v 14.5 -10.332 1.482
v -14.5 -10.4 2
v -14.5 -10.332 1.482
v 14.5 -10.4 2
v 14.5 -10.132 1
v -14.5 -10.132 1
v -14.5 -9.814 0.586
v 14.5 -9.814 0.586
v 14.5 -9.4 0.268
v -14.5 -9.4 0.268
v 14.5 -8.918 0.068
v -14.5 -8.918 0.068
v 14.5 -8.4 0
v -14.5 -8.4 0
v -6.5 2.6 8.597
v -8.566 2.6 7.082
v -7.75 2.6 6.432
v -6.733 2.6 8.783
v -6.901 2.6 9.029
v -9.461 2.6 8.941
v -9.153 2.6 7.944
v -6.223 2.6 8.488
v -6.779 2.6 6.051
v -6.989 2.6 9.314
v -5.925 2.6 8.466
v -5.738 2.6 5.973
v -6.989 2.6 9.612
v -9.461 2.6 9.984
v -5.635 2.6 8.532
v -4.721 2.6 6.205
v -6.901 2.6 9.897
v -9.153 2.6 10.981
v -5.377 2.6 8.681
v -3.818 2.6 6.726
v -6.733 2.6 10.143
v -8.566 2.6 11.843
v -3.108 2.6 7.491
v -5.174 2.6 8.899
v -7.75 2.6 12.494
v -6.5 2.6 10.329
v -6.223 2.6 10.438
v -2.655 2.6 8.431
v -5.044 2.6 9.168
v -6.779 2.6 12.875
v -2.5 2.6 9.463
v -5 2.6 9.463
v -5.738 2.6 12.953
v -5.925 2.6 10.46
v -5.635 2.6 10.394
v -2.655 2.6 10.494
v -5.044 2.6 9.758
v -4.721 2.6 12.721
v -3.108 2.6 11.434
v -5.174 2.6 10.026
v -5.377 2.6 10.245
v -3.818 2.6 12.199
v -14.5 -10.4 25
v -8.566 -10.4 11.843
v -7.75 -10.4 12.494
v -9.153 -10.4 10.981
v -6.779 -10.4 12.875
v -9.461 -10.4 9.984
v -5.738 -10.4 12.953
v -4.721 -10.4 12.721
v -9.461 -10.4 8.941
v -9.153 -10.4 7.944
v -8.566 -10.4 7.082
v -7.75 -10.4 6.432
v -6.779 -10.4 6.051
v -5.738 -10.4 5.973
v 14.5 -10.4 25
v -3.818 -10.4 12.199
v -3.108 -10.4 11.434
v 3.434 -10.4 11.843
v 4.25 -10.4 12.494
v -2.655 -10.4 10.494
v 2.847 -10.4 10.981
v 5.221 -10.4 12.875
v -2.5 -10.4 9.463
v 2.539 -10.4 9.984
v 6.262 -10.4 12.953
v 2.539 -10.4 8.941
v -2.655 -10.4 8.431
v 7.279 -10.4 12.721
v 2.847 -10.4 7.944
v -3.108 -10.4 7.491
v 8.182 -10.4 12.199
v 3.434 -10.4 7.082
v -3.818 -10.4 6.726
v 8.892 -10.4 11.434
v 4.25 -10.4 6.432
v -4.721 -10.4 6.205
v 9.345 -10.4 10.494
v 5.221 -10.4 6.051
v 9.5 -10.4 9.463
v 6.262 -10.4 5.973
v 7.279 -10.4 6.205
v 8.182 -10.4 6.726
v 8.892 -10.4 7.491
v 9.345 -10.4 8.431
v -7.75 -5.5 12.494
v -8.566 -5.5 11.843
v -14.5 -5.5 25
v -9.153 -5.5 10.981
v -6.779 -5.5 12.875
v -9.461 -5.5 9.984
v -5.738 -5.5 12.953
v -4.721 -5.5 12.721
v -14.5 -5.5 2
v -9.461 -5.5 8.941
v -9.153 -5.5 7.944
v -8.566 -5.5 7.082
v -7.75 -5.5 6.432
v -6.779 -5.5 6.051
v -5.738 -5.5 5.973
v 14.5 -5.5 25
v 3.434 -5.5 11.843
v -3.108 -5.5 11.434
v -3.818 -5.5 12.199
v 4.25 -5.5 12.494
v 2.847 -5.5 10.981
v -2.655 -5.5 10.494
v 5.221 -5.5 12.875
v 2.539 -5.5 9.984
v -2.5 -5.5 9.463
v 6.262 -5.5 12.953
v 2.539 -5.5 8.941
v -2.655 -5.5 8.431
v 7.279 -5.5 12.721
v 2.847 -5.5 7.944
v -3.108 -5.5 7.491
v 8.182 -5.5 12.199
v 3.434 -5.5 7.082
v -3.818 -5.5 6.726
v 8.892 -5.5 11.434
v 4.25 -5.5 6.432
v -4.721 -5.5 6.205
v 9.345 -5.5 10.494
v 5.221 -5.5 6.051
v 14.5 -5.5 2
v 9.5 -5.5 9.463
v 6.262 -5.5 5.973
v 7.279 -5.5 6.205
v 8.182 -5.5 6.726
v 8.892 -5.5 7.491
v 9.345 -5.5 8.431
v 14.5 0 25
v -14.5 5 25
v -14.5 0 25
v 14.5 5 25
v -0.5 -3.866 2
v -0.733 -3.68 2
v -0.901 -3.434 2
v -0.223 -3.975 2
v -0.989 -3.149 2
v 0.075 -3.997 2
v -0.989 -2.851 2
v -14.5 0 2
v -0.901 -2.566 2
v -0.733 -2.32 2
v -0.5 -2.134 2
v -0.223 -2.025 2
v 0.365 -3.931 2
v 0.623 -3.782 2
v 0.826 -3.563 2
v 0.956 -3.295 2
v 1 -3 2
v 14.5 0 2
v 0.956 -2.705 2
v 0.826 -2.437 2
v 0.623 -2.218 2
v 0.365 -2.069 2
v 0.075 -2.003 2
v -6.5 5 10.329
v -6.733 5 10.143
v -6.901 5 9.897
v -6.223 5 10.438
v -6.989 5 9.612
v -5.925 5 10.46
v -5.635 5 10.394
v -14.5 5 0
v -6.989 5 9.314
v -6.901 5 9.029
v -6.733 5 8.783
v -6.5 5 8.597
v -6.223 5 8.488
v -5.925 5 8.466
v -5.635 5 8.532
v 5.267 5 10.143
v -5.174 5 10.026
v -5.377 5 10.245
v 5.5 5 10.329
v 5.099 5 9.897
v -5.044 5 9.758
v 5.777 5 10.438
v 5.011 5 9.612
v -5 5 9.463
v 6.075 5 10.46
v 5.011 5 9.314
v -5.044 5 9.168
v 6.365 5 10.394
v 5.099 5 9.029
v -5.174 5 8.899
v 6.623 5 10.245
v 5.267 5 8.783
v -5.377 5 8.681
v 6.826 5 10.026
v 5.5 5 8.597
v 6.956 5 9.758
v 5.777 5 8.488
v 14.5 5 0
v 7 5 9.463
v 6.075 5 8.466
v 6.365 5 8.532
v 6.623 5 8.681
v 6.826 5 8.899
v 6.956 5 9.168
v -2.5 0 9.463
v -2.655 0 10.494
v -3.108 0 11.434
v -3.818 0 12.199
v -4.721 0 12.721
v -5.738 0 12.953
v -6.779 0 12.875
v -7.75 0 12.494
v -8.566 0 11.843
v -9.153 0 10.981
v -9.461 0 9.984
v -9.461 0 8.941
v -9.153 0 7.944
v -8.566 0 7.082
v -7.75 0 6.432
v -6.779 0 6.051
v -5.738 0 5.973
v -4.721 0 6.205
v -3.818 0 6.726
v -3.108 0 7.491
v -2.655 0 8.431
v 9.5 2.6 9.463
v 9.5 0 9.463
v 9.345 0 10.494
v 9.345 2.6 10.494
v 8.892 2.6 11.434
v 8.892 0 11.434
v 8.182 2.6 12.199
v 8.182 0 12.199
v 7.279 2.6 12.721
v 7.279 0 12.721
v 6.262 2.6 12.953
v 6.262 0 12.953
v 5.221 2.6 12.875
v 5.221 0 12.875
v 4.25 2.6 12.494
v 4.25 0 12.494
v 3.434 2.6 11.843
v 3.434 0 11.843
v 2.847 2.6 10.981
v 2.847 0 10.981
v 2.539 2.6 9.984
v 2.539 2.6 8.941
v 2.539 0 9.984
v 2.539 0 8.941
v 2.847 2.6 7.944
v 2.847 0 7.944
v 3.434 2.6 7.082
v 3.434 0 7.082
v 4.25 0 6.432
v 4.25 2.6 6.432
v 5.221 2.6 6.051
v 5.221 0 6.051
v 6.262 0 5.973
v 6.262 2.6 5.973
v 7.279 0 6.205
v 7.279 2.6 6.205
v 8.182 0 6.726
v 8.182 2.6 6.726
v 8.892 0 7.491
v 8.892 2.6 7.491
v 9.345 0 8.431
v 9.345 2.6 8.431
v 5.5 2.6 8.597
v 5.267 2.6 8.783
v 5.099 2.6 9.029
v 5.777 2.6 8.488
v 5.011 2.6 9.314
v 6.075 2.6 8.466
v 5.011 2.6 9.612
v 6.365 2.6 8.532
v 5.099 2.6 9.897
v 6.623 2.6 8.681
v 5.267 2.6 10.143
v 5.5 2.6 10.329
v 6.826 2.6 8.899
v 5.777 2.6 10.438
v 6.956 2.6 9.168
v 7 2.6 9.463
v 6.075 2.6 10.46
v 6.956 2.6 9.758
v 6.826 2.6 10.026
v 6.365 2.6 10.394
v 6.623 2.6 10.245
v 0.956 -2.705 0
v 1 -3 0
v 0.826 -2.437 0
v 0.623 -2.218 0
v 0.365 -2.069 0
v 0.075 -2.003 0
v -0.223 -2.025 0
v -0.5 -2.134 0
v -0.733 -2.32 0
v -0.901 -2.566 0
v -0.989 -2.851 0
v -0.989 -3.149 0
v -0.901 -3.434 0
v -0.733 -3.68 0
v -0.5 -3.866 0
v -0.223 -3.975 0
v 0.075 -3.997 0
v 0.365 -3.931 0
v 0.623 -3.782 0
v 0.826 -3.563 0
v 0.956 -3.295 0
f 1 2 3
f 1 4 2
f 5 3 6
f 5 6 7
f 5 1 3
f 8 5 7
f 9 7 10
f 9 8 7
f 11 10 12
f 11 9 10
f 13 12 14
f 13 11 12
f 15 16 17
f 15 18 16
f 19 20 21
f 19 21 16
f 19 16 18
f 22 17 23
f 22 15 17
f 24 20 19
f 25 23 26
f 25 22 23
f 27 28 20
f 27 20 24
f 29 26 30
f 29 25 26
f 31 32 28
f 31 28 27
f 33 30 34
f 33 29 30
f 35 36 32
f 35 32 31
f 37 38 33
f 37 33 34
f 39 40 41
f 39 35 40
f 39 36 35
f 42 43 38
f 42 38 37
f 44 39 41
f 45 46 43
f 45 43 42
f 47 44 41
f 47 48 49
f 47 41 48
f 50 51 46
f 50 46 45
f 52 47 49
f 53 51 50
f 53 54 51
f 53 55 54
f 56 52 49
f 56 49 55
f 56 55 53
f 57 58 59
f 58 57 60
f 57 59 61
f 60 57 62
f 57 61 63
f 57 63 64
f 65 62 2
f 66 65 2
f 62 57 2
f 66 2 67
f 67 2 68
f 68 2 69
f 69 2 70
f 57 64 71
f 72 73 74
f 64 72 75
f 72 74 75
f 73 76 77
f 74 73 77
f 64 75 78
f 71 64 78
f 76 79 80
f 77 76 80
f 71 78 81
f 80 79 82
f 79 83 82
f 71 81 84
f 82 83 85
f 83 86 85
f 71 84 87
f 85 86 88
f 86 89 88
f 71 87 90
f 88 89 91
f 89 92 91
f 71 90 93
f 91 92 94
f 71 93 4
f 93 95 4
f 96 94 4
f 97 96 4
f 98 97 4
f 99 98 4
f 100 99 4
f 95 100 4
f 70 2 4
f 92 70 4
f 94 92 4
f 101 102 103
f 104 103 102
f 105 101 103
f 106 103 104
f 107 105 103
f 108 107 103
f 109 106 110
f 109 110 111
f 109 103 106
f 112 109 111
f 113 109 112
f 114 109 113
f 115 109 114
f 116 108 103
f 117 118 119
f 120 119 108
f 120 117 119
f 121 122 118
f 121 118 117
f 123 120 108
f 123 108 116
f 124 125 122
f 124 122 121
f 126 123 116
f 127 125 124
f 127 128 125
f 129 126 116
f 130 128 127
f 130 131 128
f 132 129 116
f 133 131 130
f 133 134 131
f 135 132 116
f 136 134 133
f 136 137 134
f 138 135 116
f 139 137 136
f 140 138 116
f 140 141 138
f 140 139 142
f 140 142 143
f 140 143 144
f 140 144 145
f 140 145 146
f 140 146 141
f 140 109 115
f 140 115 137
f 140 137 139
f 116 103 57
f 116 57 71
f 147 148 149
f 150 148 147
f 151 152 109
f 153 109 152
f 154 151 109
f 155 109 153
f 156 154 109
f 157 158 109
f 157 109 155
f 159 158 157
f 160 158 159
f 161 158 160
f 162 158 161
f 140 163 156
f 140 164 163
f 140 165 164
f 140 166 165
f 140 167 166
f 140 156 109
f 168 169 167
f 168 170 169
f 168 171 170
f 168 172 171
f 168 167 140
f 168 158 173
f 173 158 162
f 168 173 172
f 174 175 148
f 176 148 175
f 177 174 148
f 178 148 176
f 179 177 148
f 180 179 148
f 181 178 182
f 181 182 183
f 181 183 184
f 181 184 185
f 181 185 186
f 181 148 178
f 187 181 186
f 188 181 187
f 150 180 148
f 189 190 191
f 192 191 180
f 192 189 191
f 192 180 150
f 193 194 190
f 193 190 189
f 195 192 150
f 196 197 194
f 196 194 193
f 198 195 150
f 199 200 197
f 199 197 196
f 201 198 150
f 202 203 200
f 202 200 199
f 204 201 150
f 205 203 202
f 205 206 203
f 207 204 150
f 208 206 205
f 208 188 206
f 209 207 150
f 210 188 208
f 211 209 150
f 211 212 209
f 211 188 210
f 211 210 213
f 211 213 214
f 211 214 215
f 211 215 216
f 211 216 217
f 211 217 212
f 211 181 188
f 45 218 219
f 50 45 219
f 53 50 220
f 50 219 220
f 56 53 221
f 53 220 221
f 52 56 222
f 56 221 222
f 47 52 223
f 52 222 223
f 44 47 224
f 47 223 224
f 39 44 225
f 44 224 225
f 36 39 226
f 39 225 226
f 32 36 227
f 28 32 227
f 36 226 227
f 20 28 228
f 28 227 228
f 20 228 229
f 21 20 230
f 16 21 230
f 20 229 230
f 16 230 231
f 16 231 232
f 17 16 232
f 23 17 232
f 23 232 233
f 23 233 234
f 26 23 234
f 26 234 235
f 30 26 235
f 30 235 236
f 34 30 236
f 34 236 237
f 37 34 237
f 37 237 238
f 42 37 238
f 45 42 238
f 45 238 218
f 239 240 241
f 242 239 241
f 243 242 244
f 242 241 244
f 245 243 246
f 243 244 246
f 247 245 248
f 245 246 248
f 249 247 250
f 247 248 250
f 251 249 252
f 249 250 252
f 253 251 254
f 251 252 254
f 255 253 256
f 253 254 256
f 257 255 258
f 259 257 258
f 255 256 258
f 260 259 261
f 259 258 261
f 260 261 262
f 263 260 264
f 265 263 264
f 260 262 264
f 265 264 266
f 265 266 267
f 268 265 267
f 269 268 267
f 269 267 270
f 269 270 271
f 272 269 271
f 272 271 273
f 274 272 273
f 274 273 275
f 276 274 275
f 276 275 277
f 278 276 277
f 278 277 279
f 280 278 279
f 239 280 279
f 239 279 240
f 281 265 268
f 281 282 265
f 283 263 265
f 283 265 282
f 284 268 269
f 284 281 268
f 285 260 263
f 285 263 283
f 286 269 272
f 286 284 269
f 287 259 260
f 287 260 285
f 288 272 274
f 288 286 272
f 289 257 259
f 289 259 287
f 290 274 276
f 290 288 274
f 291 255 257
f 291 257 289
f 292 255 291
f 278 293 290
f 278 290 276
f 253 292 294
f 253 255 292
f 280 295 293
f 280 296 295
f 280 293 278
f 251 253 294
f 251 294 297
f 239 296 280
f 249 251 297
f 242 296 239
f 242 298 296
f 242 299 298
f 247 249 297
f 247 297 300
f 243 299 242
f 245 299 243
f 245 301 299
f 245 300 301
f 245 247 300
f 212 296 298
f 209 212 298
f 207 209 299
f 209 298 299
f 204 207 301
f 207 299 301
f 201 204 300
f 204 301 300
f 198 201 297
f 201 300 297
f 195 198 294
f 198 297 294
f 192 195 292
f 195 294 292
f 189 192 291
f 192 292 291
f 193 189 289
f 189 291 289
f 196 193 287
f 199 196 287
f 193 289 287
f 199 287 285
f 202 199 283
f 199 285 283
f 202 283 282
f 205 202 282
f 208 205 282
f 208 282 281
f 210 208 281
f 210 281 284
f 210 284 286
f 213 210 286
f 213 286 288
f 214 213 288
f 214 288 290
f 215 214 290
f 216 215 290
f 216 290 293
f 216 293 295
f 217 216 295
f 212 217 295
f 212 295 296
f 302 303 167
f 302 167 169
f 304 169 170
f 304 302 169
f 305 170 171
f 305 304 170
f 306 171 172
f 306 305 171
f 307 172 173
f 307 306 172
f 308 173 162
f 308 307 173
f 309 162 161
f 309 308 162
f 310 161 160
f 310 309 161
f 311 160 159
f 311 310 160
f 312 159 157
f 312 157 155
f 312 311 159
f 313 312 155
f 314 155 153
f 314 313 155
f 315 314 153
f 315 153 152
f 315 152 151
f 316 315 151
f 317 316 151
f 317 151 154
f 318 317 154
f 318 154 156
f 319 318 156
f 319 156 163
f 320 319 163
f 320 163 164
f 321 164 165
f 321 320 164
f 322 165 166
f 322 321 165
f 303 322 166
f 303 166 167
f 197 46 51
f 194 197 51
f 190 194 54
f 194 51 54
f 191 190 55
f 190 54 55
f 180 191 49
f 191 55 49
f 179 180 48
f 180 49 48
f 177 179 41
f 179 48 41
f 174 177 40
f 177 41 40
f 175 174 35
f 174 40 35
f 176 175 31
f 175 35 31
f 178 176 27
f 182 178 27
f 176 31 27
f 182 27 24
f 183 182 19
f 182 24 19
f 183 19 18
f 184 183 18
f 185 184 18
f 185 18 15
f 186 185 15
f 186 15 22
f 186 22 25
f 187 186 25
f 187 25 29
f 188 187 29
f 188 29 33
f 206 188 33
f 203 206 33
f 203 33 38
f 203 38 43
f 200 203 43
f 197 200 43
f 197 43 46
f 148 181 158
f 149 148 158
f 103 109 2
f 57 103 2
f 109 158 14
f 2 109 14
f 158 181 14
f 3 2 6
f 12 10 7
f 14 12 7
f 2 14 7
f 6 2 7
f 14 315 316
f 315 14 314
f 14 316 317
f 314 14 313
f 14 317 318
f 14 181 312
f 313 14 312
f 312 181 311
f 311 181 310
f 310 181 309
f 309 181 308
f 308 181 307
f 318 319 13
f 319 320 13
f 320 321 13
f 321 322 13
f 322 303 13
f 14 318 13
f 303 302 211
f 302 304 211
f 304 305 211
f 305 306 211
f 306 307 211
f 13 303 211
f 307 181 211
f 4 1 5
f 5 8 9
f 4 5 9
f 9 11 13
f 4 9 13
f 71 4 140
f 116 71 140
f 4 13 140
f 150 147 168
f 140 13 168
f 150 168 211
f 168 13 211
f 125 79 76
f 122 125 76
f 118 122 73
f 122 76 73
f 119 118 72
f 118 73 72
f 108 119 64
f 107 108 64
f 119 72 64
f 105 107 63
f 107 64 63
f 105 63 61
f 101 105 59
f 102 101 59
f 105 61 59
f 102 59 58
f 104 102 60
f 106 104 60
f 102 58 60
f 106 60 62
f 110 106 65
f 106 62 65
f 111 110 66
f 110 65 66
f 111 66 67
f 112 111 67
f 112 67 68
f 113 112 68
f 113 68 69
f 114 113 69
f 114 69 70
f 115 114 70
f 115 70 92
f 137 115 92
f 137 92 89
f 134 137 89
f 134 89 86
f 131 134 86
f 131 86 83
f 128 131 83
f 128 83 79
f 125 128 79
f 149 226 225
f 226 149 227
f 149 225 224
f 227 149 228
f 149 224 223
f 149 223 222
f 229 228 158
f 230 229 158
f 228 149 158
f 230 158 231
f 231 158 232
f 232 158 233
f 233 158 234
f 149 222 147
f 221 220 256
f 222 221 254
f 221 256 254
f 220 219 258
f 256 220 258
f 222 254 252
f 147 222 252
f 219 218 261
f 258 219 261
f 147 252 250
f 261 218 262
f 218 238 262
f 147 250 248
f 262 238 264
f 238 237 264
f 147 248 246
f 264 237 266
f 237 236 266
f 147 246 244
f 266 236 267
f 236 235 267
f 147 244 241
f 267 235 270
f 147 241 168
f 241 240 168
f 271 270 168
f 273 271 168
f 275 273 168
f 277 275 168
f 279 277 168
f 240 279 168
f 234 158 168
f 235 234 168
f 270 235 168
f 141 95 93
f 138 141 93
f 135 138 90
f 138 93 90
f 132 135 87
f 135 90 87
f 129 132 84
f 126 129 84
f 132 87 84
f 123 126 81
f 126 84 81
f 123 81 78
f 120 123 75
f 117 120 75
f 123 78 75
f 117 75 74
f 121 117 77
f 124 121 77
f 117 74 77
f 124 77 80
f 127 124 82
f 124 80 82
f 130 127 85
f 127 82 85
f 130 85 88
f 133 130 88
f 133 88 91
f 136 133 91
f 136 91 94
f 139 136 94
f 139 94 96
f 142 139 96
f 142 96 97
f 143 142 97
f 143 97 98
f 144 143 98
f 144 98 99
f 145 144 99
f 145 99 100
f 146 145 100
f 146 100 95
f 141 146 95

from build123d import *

# Parameters (mm, degrees)
F0_W     = 29
F0_H     = 4.9
F0_H_2   = 5.5
F0_R     = 1
F0_H_3   = 5
F1_DEPTH = 2
F2_DEPTH = 25
F3_R     = 1
F4_DEPTH = 25
F3_R_2   = 3.5
F5_DEPTH = 13
F6_R     = 2


with BuildPart() as f1:
    # F0 (on Top) → F1 (new body)
    with BuildSketch(Plane.XY):
        with Locations((0, -7.95)):
            Rectangle(F0_W, F0_H)
        with Locations((0, -2.75)):
            Rectangle(F0_W, F0_H_2)
        with Locations((0, -3)):
            Circle(F0_R, mode=Mode.SUBTRACT)
        with Locations((0, 2.5)):
            Rectangle(F0_W, F0_H_3)
    extrude(amount=F1_DEPTH)

    # F0 (on Top) → F2 (join)
    with BuildSketch(Plane.XY):
        with Locations((0, -7.95)):
            Rectangle(F0_W, F0_H)
        with Locations((0, 2.5)):
            Rectangle(F0_W, F0_H_3)
    extrude(amount=F2_DEPTH)

    # F3 (on face) → F4 (cut)
    with BuildSketch(Plane.XZ.offset(10.4)):
        with Locations((6, 9.462781)):
            Circle(F3_R)
        with Locations((-6, 9.462781)):
            Circle(F3_R)
    extrude(amount=-F4_DEPTH, mode=Mode.SUBTRACT)

    # F3 (on face) → F5 (cut)
    with BuildSketch(Plane.XZ.offset(10.4)):
        with Locations((-6, 9.462781)):
            Circle(F3_R_2)
        with Locations((-6, 9.462781)):
            Circle(F3_R, mode=Mode.SUBTRACT)
        with Locations((6, 9.462781)):
            Circle(F3_R_2)
        with Locations((6, 9.462781)):
            Circle(F3_R, mode=Mode.SUBTRACT)
    extrude(amount=-F5_DEPTH, mode=Mode.SUBTRACT)

    # F6
    f6_edges = [f1.edges().sort_by_distance(p)[0] for p in [
        (0, -10.4, 0),
    ]]
    fillet(f6_edges, radius=F6_R)


solid = f1.part
